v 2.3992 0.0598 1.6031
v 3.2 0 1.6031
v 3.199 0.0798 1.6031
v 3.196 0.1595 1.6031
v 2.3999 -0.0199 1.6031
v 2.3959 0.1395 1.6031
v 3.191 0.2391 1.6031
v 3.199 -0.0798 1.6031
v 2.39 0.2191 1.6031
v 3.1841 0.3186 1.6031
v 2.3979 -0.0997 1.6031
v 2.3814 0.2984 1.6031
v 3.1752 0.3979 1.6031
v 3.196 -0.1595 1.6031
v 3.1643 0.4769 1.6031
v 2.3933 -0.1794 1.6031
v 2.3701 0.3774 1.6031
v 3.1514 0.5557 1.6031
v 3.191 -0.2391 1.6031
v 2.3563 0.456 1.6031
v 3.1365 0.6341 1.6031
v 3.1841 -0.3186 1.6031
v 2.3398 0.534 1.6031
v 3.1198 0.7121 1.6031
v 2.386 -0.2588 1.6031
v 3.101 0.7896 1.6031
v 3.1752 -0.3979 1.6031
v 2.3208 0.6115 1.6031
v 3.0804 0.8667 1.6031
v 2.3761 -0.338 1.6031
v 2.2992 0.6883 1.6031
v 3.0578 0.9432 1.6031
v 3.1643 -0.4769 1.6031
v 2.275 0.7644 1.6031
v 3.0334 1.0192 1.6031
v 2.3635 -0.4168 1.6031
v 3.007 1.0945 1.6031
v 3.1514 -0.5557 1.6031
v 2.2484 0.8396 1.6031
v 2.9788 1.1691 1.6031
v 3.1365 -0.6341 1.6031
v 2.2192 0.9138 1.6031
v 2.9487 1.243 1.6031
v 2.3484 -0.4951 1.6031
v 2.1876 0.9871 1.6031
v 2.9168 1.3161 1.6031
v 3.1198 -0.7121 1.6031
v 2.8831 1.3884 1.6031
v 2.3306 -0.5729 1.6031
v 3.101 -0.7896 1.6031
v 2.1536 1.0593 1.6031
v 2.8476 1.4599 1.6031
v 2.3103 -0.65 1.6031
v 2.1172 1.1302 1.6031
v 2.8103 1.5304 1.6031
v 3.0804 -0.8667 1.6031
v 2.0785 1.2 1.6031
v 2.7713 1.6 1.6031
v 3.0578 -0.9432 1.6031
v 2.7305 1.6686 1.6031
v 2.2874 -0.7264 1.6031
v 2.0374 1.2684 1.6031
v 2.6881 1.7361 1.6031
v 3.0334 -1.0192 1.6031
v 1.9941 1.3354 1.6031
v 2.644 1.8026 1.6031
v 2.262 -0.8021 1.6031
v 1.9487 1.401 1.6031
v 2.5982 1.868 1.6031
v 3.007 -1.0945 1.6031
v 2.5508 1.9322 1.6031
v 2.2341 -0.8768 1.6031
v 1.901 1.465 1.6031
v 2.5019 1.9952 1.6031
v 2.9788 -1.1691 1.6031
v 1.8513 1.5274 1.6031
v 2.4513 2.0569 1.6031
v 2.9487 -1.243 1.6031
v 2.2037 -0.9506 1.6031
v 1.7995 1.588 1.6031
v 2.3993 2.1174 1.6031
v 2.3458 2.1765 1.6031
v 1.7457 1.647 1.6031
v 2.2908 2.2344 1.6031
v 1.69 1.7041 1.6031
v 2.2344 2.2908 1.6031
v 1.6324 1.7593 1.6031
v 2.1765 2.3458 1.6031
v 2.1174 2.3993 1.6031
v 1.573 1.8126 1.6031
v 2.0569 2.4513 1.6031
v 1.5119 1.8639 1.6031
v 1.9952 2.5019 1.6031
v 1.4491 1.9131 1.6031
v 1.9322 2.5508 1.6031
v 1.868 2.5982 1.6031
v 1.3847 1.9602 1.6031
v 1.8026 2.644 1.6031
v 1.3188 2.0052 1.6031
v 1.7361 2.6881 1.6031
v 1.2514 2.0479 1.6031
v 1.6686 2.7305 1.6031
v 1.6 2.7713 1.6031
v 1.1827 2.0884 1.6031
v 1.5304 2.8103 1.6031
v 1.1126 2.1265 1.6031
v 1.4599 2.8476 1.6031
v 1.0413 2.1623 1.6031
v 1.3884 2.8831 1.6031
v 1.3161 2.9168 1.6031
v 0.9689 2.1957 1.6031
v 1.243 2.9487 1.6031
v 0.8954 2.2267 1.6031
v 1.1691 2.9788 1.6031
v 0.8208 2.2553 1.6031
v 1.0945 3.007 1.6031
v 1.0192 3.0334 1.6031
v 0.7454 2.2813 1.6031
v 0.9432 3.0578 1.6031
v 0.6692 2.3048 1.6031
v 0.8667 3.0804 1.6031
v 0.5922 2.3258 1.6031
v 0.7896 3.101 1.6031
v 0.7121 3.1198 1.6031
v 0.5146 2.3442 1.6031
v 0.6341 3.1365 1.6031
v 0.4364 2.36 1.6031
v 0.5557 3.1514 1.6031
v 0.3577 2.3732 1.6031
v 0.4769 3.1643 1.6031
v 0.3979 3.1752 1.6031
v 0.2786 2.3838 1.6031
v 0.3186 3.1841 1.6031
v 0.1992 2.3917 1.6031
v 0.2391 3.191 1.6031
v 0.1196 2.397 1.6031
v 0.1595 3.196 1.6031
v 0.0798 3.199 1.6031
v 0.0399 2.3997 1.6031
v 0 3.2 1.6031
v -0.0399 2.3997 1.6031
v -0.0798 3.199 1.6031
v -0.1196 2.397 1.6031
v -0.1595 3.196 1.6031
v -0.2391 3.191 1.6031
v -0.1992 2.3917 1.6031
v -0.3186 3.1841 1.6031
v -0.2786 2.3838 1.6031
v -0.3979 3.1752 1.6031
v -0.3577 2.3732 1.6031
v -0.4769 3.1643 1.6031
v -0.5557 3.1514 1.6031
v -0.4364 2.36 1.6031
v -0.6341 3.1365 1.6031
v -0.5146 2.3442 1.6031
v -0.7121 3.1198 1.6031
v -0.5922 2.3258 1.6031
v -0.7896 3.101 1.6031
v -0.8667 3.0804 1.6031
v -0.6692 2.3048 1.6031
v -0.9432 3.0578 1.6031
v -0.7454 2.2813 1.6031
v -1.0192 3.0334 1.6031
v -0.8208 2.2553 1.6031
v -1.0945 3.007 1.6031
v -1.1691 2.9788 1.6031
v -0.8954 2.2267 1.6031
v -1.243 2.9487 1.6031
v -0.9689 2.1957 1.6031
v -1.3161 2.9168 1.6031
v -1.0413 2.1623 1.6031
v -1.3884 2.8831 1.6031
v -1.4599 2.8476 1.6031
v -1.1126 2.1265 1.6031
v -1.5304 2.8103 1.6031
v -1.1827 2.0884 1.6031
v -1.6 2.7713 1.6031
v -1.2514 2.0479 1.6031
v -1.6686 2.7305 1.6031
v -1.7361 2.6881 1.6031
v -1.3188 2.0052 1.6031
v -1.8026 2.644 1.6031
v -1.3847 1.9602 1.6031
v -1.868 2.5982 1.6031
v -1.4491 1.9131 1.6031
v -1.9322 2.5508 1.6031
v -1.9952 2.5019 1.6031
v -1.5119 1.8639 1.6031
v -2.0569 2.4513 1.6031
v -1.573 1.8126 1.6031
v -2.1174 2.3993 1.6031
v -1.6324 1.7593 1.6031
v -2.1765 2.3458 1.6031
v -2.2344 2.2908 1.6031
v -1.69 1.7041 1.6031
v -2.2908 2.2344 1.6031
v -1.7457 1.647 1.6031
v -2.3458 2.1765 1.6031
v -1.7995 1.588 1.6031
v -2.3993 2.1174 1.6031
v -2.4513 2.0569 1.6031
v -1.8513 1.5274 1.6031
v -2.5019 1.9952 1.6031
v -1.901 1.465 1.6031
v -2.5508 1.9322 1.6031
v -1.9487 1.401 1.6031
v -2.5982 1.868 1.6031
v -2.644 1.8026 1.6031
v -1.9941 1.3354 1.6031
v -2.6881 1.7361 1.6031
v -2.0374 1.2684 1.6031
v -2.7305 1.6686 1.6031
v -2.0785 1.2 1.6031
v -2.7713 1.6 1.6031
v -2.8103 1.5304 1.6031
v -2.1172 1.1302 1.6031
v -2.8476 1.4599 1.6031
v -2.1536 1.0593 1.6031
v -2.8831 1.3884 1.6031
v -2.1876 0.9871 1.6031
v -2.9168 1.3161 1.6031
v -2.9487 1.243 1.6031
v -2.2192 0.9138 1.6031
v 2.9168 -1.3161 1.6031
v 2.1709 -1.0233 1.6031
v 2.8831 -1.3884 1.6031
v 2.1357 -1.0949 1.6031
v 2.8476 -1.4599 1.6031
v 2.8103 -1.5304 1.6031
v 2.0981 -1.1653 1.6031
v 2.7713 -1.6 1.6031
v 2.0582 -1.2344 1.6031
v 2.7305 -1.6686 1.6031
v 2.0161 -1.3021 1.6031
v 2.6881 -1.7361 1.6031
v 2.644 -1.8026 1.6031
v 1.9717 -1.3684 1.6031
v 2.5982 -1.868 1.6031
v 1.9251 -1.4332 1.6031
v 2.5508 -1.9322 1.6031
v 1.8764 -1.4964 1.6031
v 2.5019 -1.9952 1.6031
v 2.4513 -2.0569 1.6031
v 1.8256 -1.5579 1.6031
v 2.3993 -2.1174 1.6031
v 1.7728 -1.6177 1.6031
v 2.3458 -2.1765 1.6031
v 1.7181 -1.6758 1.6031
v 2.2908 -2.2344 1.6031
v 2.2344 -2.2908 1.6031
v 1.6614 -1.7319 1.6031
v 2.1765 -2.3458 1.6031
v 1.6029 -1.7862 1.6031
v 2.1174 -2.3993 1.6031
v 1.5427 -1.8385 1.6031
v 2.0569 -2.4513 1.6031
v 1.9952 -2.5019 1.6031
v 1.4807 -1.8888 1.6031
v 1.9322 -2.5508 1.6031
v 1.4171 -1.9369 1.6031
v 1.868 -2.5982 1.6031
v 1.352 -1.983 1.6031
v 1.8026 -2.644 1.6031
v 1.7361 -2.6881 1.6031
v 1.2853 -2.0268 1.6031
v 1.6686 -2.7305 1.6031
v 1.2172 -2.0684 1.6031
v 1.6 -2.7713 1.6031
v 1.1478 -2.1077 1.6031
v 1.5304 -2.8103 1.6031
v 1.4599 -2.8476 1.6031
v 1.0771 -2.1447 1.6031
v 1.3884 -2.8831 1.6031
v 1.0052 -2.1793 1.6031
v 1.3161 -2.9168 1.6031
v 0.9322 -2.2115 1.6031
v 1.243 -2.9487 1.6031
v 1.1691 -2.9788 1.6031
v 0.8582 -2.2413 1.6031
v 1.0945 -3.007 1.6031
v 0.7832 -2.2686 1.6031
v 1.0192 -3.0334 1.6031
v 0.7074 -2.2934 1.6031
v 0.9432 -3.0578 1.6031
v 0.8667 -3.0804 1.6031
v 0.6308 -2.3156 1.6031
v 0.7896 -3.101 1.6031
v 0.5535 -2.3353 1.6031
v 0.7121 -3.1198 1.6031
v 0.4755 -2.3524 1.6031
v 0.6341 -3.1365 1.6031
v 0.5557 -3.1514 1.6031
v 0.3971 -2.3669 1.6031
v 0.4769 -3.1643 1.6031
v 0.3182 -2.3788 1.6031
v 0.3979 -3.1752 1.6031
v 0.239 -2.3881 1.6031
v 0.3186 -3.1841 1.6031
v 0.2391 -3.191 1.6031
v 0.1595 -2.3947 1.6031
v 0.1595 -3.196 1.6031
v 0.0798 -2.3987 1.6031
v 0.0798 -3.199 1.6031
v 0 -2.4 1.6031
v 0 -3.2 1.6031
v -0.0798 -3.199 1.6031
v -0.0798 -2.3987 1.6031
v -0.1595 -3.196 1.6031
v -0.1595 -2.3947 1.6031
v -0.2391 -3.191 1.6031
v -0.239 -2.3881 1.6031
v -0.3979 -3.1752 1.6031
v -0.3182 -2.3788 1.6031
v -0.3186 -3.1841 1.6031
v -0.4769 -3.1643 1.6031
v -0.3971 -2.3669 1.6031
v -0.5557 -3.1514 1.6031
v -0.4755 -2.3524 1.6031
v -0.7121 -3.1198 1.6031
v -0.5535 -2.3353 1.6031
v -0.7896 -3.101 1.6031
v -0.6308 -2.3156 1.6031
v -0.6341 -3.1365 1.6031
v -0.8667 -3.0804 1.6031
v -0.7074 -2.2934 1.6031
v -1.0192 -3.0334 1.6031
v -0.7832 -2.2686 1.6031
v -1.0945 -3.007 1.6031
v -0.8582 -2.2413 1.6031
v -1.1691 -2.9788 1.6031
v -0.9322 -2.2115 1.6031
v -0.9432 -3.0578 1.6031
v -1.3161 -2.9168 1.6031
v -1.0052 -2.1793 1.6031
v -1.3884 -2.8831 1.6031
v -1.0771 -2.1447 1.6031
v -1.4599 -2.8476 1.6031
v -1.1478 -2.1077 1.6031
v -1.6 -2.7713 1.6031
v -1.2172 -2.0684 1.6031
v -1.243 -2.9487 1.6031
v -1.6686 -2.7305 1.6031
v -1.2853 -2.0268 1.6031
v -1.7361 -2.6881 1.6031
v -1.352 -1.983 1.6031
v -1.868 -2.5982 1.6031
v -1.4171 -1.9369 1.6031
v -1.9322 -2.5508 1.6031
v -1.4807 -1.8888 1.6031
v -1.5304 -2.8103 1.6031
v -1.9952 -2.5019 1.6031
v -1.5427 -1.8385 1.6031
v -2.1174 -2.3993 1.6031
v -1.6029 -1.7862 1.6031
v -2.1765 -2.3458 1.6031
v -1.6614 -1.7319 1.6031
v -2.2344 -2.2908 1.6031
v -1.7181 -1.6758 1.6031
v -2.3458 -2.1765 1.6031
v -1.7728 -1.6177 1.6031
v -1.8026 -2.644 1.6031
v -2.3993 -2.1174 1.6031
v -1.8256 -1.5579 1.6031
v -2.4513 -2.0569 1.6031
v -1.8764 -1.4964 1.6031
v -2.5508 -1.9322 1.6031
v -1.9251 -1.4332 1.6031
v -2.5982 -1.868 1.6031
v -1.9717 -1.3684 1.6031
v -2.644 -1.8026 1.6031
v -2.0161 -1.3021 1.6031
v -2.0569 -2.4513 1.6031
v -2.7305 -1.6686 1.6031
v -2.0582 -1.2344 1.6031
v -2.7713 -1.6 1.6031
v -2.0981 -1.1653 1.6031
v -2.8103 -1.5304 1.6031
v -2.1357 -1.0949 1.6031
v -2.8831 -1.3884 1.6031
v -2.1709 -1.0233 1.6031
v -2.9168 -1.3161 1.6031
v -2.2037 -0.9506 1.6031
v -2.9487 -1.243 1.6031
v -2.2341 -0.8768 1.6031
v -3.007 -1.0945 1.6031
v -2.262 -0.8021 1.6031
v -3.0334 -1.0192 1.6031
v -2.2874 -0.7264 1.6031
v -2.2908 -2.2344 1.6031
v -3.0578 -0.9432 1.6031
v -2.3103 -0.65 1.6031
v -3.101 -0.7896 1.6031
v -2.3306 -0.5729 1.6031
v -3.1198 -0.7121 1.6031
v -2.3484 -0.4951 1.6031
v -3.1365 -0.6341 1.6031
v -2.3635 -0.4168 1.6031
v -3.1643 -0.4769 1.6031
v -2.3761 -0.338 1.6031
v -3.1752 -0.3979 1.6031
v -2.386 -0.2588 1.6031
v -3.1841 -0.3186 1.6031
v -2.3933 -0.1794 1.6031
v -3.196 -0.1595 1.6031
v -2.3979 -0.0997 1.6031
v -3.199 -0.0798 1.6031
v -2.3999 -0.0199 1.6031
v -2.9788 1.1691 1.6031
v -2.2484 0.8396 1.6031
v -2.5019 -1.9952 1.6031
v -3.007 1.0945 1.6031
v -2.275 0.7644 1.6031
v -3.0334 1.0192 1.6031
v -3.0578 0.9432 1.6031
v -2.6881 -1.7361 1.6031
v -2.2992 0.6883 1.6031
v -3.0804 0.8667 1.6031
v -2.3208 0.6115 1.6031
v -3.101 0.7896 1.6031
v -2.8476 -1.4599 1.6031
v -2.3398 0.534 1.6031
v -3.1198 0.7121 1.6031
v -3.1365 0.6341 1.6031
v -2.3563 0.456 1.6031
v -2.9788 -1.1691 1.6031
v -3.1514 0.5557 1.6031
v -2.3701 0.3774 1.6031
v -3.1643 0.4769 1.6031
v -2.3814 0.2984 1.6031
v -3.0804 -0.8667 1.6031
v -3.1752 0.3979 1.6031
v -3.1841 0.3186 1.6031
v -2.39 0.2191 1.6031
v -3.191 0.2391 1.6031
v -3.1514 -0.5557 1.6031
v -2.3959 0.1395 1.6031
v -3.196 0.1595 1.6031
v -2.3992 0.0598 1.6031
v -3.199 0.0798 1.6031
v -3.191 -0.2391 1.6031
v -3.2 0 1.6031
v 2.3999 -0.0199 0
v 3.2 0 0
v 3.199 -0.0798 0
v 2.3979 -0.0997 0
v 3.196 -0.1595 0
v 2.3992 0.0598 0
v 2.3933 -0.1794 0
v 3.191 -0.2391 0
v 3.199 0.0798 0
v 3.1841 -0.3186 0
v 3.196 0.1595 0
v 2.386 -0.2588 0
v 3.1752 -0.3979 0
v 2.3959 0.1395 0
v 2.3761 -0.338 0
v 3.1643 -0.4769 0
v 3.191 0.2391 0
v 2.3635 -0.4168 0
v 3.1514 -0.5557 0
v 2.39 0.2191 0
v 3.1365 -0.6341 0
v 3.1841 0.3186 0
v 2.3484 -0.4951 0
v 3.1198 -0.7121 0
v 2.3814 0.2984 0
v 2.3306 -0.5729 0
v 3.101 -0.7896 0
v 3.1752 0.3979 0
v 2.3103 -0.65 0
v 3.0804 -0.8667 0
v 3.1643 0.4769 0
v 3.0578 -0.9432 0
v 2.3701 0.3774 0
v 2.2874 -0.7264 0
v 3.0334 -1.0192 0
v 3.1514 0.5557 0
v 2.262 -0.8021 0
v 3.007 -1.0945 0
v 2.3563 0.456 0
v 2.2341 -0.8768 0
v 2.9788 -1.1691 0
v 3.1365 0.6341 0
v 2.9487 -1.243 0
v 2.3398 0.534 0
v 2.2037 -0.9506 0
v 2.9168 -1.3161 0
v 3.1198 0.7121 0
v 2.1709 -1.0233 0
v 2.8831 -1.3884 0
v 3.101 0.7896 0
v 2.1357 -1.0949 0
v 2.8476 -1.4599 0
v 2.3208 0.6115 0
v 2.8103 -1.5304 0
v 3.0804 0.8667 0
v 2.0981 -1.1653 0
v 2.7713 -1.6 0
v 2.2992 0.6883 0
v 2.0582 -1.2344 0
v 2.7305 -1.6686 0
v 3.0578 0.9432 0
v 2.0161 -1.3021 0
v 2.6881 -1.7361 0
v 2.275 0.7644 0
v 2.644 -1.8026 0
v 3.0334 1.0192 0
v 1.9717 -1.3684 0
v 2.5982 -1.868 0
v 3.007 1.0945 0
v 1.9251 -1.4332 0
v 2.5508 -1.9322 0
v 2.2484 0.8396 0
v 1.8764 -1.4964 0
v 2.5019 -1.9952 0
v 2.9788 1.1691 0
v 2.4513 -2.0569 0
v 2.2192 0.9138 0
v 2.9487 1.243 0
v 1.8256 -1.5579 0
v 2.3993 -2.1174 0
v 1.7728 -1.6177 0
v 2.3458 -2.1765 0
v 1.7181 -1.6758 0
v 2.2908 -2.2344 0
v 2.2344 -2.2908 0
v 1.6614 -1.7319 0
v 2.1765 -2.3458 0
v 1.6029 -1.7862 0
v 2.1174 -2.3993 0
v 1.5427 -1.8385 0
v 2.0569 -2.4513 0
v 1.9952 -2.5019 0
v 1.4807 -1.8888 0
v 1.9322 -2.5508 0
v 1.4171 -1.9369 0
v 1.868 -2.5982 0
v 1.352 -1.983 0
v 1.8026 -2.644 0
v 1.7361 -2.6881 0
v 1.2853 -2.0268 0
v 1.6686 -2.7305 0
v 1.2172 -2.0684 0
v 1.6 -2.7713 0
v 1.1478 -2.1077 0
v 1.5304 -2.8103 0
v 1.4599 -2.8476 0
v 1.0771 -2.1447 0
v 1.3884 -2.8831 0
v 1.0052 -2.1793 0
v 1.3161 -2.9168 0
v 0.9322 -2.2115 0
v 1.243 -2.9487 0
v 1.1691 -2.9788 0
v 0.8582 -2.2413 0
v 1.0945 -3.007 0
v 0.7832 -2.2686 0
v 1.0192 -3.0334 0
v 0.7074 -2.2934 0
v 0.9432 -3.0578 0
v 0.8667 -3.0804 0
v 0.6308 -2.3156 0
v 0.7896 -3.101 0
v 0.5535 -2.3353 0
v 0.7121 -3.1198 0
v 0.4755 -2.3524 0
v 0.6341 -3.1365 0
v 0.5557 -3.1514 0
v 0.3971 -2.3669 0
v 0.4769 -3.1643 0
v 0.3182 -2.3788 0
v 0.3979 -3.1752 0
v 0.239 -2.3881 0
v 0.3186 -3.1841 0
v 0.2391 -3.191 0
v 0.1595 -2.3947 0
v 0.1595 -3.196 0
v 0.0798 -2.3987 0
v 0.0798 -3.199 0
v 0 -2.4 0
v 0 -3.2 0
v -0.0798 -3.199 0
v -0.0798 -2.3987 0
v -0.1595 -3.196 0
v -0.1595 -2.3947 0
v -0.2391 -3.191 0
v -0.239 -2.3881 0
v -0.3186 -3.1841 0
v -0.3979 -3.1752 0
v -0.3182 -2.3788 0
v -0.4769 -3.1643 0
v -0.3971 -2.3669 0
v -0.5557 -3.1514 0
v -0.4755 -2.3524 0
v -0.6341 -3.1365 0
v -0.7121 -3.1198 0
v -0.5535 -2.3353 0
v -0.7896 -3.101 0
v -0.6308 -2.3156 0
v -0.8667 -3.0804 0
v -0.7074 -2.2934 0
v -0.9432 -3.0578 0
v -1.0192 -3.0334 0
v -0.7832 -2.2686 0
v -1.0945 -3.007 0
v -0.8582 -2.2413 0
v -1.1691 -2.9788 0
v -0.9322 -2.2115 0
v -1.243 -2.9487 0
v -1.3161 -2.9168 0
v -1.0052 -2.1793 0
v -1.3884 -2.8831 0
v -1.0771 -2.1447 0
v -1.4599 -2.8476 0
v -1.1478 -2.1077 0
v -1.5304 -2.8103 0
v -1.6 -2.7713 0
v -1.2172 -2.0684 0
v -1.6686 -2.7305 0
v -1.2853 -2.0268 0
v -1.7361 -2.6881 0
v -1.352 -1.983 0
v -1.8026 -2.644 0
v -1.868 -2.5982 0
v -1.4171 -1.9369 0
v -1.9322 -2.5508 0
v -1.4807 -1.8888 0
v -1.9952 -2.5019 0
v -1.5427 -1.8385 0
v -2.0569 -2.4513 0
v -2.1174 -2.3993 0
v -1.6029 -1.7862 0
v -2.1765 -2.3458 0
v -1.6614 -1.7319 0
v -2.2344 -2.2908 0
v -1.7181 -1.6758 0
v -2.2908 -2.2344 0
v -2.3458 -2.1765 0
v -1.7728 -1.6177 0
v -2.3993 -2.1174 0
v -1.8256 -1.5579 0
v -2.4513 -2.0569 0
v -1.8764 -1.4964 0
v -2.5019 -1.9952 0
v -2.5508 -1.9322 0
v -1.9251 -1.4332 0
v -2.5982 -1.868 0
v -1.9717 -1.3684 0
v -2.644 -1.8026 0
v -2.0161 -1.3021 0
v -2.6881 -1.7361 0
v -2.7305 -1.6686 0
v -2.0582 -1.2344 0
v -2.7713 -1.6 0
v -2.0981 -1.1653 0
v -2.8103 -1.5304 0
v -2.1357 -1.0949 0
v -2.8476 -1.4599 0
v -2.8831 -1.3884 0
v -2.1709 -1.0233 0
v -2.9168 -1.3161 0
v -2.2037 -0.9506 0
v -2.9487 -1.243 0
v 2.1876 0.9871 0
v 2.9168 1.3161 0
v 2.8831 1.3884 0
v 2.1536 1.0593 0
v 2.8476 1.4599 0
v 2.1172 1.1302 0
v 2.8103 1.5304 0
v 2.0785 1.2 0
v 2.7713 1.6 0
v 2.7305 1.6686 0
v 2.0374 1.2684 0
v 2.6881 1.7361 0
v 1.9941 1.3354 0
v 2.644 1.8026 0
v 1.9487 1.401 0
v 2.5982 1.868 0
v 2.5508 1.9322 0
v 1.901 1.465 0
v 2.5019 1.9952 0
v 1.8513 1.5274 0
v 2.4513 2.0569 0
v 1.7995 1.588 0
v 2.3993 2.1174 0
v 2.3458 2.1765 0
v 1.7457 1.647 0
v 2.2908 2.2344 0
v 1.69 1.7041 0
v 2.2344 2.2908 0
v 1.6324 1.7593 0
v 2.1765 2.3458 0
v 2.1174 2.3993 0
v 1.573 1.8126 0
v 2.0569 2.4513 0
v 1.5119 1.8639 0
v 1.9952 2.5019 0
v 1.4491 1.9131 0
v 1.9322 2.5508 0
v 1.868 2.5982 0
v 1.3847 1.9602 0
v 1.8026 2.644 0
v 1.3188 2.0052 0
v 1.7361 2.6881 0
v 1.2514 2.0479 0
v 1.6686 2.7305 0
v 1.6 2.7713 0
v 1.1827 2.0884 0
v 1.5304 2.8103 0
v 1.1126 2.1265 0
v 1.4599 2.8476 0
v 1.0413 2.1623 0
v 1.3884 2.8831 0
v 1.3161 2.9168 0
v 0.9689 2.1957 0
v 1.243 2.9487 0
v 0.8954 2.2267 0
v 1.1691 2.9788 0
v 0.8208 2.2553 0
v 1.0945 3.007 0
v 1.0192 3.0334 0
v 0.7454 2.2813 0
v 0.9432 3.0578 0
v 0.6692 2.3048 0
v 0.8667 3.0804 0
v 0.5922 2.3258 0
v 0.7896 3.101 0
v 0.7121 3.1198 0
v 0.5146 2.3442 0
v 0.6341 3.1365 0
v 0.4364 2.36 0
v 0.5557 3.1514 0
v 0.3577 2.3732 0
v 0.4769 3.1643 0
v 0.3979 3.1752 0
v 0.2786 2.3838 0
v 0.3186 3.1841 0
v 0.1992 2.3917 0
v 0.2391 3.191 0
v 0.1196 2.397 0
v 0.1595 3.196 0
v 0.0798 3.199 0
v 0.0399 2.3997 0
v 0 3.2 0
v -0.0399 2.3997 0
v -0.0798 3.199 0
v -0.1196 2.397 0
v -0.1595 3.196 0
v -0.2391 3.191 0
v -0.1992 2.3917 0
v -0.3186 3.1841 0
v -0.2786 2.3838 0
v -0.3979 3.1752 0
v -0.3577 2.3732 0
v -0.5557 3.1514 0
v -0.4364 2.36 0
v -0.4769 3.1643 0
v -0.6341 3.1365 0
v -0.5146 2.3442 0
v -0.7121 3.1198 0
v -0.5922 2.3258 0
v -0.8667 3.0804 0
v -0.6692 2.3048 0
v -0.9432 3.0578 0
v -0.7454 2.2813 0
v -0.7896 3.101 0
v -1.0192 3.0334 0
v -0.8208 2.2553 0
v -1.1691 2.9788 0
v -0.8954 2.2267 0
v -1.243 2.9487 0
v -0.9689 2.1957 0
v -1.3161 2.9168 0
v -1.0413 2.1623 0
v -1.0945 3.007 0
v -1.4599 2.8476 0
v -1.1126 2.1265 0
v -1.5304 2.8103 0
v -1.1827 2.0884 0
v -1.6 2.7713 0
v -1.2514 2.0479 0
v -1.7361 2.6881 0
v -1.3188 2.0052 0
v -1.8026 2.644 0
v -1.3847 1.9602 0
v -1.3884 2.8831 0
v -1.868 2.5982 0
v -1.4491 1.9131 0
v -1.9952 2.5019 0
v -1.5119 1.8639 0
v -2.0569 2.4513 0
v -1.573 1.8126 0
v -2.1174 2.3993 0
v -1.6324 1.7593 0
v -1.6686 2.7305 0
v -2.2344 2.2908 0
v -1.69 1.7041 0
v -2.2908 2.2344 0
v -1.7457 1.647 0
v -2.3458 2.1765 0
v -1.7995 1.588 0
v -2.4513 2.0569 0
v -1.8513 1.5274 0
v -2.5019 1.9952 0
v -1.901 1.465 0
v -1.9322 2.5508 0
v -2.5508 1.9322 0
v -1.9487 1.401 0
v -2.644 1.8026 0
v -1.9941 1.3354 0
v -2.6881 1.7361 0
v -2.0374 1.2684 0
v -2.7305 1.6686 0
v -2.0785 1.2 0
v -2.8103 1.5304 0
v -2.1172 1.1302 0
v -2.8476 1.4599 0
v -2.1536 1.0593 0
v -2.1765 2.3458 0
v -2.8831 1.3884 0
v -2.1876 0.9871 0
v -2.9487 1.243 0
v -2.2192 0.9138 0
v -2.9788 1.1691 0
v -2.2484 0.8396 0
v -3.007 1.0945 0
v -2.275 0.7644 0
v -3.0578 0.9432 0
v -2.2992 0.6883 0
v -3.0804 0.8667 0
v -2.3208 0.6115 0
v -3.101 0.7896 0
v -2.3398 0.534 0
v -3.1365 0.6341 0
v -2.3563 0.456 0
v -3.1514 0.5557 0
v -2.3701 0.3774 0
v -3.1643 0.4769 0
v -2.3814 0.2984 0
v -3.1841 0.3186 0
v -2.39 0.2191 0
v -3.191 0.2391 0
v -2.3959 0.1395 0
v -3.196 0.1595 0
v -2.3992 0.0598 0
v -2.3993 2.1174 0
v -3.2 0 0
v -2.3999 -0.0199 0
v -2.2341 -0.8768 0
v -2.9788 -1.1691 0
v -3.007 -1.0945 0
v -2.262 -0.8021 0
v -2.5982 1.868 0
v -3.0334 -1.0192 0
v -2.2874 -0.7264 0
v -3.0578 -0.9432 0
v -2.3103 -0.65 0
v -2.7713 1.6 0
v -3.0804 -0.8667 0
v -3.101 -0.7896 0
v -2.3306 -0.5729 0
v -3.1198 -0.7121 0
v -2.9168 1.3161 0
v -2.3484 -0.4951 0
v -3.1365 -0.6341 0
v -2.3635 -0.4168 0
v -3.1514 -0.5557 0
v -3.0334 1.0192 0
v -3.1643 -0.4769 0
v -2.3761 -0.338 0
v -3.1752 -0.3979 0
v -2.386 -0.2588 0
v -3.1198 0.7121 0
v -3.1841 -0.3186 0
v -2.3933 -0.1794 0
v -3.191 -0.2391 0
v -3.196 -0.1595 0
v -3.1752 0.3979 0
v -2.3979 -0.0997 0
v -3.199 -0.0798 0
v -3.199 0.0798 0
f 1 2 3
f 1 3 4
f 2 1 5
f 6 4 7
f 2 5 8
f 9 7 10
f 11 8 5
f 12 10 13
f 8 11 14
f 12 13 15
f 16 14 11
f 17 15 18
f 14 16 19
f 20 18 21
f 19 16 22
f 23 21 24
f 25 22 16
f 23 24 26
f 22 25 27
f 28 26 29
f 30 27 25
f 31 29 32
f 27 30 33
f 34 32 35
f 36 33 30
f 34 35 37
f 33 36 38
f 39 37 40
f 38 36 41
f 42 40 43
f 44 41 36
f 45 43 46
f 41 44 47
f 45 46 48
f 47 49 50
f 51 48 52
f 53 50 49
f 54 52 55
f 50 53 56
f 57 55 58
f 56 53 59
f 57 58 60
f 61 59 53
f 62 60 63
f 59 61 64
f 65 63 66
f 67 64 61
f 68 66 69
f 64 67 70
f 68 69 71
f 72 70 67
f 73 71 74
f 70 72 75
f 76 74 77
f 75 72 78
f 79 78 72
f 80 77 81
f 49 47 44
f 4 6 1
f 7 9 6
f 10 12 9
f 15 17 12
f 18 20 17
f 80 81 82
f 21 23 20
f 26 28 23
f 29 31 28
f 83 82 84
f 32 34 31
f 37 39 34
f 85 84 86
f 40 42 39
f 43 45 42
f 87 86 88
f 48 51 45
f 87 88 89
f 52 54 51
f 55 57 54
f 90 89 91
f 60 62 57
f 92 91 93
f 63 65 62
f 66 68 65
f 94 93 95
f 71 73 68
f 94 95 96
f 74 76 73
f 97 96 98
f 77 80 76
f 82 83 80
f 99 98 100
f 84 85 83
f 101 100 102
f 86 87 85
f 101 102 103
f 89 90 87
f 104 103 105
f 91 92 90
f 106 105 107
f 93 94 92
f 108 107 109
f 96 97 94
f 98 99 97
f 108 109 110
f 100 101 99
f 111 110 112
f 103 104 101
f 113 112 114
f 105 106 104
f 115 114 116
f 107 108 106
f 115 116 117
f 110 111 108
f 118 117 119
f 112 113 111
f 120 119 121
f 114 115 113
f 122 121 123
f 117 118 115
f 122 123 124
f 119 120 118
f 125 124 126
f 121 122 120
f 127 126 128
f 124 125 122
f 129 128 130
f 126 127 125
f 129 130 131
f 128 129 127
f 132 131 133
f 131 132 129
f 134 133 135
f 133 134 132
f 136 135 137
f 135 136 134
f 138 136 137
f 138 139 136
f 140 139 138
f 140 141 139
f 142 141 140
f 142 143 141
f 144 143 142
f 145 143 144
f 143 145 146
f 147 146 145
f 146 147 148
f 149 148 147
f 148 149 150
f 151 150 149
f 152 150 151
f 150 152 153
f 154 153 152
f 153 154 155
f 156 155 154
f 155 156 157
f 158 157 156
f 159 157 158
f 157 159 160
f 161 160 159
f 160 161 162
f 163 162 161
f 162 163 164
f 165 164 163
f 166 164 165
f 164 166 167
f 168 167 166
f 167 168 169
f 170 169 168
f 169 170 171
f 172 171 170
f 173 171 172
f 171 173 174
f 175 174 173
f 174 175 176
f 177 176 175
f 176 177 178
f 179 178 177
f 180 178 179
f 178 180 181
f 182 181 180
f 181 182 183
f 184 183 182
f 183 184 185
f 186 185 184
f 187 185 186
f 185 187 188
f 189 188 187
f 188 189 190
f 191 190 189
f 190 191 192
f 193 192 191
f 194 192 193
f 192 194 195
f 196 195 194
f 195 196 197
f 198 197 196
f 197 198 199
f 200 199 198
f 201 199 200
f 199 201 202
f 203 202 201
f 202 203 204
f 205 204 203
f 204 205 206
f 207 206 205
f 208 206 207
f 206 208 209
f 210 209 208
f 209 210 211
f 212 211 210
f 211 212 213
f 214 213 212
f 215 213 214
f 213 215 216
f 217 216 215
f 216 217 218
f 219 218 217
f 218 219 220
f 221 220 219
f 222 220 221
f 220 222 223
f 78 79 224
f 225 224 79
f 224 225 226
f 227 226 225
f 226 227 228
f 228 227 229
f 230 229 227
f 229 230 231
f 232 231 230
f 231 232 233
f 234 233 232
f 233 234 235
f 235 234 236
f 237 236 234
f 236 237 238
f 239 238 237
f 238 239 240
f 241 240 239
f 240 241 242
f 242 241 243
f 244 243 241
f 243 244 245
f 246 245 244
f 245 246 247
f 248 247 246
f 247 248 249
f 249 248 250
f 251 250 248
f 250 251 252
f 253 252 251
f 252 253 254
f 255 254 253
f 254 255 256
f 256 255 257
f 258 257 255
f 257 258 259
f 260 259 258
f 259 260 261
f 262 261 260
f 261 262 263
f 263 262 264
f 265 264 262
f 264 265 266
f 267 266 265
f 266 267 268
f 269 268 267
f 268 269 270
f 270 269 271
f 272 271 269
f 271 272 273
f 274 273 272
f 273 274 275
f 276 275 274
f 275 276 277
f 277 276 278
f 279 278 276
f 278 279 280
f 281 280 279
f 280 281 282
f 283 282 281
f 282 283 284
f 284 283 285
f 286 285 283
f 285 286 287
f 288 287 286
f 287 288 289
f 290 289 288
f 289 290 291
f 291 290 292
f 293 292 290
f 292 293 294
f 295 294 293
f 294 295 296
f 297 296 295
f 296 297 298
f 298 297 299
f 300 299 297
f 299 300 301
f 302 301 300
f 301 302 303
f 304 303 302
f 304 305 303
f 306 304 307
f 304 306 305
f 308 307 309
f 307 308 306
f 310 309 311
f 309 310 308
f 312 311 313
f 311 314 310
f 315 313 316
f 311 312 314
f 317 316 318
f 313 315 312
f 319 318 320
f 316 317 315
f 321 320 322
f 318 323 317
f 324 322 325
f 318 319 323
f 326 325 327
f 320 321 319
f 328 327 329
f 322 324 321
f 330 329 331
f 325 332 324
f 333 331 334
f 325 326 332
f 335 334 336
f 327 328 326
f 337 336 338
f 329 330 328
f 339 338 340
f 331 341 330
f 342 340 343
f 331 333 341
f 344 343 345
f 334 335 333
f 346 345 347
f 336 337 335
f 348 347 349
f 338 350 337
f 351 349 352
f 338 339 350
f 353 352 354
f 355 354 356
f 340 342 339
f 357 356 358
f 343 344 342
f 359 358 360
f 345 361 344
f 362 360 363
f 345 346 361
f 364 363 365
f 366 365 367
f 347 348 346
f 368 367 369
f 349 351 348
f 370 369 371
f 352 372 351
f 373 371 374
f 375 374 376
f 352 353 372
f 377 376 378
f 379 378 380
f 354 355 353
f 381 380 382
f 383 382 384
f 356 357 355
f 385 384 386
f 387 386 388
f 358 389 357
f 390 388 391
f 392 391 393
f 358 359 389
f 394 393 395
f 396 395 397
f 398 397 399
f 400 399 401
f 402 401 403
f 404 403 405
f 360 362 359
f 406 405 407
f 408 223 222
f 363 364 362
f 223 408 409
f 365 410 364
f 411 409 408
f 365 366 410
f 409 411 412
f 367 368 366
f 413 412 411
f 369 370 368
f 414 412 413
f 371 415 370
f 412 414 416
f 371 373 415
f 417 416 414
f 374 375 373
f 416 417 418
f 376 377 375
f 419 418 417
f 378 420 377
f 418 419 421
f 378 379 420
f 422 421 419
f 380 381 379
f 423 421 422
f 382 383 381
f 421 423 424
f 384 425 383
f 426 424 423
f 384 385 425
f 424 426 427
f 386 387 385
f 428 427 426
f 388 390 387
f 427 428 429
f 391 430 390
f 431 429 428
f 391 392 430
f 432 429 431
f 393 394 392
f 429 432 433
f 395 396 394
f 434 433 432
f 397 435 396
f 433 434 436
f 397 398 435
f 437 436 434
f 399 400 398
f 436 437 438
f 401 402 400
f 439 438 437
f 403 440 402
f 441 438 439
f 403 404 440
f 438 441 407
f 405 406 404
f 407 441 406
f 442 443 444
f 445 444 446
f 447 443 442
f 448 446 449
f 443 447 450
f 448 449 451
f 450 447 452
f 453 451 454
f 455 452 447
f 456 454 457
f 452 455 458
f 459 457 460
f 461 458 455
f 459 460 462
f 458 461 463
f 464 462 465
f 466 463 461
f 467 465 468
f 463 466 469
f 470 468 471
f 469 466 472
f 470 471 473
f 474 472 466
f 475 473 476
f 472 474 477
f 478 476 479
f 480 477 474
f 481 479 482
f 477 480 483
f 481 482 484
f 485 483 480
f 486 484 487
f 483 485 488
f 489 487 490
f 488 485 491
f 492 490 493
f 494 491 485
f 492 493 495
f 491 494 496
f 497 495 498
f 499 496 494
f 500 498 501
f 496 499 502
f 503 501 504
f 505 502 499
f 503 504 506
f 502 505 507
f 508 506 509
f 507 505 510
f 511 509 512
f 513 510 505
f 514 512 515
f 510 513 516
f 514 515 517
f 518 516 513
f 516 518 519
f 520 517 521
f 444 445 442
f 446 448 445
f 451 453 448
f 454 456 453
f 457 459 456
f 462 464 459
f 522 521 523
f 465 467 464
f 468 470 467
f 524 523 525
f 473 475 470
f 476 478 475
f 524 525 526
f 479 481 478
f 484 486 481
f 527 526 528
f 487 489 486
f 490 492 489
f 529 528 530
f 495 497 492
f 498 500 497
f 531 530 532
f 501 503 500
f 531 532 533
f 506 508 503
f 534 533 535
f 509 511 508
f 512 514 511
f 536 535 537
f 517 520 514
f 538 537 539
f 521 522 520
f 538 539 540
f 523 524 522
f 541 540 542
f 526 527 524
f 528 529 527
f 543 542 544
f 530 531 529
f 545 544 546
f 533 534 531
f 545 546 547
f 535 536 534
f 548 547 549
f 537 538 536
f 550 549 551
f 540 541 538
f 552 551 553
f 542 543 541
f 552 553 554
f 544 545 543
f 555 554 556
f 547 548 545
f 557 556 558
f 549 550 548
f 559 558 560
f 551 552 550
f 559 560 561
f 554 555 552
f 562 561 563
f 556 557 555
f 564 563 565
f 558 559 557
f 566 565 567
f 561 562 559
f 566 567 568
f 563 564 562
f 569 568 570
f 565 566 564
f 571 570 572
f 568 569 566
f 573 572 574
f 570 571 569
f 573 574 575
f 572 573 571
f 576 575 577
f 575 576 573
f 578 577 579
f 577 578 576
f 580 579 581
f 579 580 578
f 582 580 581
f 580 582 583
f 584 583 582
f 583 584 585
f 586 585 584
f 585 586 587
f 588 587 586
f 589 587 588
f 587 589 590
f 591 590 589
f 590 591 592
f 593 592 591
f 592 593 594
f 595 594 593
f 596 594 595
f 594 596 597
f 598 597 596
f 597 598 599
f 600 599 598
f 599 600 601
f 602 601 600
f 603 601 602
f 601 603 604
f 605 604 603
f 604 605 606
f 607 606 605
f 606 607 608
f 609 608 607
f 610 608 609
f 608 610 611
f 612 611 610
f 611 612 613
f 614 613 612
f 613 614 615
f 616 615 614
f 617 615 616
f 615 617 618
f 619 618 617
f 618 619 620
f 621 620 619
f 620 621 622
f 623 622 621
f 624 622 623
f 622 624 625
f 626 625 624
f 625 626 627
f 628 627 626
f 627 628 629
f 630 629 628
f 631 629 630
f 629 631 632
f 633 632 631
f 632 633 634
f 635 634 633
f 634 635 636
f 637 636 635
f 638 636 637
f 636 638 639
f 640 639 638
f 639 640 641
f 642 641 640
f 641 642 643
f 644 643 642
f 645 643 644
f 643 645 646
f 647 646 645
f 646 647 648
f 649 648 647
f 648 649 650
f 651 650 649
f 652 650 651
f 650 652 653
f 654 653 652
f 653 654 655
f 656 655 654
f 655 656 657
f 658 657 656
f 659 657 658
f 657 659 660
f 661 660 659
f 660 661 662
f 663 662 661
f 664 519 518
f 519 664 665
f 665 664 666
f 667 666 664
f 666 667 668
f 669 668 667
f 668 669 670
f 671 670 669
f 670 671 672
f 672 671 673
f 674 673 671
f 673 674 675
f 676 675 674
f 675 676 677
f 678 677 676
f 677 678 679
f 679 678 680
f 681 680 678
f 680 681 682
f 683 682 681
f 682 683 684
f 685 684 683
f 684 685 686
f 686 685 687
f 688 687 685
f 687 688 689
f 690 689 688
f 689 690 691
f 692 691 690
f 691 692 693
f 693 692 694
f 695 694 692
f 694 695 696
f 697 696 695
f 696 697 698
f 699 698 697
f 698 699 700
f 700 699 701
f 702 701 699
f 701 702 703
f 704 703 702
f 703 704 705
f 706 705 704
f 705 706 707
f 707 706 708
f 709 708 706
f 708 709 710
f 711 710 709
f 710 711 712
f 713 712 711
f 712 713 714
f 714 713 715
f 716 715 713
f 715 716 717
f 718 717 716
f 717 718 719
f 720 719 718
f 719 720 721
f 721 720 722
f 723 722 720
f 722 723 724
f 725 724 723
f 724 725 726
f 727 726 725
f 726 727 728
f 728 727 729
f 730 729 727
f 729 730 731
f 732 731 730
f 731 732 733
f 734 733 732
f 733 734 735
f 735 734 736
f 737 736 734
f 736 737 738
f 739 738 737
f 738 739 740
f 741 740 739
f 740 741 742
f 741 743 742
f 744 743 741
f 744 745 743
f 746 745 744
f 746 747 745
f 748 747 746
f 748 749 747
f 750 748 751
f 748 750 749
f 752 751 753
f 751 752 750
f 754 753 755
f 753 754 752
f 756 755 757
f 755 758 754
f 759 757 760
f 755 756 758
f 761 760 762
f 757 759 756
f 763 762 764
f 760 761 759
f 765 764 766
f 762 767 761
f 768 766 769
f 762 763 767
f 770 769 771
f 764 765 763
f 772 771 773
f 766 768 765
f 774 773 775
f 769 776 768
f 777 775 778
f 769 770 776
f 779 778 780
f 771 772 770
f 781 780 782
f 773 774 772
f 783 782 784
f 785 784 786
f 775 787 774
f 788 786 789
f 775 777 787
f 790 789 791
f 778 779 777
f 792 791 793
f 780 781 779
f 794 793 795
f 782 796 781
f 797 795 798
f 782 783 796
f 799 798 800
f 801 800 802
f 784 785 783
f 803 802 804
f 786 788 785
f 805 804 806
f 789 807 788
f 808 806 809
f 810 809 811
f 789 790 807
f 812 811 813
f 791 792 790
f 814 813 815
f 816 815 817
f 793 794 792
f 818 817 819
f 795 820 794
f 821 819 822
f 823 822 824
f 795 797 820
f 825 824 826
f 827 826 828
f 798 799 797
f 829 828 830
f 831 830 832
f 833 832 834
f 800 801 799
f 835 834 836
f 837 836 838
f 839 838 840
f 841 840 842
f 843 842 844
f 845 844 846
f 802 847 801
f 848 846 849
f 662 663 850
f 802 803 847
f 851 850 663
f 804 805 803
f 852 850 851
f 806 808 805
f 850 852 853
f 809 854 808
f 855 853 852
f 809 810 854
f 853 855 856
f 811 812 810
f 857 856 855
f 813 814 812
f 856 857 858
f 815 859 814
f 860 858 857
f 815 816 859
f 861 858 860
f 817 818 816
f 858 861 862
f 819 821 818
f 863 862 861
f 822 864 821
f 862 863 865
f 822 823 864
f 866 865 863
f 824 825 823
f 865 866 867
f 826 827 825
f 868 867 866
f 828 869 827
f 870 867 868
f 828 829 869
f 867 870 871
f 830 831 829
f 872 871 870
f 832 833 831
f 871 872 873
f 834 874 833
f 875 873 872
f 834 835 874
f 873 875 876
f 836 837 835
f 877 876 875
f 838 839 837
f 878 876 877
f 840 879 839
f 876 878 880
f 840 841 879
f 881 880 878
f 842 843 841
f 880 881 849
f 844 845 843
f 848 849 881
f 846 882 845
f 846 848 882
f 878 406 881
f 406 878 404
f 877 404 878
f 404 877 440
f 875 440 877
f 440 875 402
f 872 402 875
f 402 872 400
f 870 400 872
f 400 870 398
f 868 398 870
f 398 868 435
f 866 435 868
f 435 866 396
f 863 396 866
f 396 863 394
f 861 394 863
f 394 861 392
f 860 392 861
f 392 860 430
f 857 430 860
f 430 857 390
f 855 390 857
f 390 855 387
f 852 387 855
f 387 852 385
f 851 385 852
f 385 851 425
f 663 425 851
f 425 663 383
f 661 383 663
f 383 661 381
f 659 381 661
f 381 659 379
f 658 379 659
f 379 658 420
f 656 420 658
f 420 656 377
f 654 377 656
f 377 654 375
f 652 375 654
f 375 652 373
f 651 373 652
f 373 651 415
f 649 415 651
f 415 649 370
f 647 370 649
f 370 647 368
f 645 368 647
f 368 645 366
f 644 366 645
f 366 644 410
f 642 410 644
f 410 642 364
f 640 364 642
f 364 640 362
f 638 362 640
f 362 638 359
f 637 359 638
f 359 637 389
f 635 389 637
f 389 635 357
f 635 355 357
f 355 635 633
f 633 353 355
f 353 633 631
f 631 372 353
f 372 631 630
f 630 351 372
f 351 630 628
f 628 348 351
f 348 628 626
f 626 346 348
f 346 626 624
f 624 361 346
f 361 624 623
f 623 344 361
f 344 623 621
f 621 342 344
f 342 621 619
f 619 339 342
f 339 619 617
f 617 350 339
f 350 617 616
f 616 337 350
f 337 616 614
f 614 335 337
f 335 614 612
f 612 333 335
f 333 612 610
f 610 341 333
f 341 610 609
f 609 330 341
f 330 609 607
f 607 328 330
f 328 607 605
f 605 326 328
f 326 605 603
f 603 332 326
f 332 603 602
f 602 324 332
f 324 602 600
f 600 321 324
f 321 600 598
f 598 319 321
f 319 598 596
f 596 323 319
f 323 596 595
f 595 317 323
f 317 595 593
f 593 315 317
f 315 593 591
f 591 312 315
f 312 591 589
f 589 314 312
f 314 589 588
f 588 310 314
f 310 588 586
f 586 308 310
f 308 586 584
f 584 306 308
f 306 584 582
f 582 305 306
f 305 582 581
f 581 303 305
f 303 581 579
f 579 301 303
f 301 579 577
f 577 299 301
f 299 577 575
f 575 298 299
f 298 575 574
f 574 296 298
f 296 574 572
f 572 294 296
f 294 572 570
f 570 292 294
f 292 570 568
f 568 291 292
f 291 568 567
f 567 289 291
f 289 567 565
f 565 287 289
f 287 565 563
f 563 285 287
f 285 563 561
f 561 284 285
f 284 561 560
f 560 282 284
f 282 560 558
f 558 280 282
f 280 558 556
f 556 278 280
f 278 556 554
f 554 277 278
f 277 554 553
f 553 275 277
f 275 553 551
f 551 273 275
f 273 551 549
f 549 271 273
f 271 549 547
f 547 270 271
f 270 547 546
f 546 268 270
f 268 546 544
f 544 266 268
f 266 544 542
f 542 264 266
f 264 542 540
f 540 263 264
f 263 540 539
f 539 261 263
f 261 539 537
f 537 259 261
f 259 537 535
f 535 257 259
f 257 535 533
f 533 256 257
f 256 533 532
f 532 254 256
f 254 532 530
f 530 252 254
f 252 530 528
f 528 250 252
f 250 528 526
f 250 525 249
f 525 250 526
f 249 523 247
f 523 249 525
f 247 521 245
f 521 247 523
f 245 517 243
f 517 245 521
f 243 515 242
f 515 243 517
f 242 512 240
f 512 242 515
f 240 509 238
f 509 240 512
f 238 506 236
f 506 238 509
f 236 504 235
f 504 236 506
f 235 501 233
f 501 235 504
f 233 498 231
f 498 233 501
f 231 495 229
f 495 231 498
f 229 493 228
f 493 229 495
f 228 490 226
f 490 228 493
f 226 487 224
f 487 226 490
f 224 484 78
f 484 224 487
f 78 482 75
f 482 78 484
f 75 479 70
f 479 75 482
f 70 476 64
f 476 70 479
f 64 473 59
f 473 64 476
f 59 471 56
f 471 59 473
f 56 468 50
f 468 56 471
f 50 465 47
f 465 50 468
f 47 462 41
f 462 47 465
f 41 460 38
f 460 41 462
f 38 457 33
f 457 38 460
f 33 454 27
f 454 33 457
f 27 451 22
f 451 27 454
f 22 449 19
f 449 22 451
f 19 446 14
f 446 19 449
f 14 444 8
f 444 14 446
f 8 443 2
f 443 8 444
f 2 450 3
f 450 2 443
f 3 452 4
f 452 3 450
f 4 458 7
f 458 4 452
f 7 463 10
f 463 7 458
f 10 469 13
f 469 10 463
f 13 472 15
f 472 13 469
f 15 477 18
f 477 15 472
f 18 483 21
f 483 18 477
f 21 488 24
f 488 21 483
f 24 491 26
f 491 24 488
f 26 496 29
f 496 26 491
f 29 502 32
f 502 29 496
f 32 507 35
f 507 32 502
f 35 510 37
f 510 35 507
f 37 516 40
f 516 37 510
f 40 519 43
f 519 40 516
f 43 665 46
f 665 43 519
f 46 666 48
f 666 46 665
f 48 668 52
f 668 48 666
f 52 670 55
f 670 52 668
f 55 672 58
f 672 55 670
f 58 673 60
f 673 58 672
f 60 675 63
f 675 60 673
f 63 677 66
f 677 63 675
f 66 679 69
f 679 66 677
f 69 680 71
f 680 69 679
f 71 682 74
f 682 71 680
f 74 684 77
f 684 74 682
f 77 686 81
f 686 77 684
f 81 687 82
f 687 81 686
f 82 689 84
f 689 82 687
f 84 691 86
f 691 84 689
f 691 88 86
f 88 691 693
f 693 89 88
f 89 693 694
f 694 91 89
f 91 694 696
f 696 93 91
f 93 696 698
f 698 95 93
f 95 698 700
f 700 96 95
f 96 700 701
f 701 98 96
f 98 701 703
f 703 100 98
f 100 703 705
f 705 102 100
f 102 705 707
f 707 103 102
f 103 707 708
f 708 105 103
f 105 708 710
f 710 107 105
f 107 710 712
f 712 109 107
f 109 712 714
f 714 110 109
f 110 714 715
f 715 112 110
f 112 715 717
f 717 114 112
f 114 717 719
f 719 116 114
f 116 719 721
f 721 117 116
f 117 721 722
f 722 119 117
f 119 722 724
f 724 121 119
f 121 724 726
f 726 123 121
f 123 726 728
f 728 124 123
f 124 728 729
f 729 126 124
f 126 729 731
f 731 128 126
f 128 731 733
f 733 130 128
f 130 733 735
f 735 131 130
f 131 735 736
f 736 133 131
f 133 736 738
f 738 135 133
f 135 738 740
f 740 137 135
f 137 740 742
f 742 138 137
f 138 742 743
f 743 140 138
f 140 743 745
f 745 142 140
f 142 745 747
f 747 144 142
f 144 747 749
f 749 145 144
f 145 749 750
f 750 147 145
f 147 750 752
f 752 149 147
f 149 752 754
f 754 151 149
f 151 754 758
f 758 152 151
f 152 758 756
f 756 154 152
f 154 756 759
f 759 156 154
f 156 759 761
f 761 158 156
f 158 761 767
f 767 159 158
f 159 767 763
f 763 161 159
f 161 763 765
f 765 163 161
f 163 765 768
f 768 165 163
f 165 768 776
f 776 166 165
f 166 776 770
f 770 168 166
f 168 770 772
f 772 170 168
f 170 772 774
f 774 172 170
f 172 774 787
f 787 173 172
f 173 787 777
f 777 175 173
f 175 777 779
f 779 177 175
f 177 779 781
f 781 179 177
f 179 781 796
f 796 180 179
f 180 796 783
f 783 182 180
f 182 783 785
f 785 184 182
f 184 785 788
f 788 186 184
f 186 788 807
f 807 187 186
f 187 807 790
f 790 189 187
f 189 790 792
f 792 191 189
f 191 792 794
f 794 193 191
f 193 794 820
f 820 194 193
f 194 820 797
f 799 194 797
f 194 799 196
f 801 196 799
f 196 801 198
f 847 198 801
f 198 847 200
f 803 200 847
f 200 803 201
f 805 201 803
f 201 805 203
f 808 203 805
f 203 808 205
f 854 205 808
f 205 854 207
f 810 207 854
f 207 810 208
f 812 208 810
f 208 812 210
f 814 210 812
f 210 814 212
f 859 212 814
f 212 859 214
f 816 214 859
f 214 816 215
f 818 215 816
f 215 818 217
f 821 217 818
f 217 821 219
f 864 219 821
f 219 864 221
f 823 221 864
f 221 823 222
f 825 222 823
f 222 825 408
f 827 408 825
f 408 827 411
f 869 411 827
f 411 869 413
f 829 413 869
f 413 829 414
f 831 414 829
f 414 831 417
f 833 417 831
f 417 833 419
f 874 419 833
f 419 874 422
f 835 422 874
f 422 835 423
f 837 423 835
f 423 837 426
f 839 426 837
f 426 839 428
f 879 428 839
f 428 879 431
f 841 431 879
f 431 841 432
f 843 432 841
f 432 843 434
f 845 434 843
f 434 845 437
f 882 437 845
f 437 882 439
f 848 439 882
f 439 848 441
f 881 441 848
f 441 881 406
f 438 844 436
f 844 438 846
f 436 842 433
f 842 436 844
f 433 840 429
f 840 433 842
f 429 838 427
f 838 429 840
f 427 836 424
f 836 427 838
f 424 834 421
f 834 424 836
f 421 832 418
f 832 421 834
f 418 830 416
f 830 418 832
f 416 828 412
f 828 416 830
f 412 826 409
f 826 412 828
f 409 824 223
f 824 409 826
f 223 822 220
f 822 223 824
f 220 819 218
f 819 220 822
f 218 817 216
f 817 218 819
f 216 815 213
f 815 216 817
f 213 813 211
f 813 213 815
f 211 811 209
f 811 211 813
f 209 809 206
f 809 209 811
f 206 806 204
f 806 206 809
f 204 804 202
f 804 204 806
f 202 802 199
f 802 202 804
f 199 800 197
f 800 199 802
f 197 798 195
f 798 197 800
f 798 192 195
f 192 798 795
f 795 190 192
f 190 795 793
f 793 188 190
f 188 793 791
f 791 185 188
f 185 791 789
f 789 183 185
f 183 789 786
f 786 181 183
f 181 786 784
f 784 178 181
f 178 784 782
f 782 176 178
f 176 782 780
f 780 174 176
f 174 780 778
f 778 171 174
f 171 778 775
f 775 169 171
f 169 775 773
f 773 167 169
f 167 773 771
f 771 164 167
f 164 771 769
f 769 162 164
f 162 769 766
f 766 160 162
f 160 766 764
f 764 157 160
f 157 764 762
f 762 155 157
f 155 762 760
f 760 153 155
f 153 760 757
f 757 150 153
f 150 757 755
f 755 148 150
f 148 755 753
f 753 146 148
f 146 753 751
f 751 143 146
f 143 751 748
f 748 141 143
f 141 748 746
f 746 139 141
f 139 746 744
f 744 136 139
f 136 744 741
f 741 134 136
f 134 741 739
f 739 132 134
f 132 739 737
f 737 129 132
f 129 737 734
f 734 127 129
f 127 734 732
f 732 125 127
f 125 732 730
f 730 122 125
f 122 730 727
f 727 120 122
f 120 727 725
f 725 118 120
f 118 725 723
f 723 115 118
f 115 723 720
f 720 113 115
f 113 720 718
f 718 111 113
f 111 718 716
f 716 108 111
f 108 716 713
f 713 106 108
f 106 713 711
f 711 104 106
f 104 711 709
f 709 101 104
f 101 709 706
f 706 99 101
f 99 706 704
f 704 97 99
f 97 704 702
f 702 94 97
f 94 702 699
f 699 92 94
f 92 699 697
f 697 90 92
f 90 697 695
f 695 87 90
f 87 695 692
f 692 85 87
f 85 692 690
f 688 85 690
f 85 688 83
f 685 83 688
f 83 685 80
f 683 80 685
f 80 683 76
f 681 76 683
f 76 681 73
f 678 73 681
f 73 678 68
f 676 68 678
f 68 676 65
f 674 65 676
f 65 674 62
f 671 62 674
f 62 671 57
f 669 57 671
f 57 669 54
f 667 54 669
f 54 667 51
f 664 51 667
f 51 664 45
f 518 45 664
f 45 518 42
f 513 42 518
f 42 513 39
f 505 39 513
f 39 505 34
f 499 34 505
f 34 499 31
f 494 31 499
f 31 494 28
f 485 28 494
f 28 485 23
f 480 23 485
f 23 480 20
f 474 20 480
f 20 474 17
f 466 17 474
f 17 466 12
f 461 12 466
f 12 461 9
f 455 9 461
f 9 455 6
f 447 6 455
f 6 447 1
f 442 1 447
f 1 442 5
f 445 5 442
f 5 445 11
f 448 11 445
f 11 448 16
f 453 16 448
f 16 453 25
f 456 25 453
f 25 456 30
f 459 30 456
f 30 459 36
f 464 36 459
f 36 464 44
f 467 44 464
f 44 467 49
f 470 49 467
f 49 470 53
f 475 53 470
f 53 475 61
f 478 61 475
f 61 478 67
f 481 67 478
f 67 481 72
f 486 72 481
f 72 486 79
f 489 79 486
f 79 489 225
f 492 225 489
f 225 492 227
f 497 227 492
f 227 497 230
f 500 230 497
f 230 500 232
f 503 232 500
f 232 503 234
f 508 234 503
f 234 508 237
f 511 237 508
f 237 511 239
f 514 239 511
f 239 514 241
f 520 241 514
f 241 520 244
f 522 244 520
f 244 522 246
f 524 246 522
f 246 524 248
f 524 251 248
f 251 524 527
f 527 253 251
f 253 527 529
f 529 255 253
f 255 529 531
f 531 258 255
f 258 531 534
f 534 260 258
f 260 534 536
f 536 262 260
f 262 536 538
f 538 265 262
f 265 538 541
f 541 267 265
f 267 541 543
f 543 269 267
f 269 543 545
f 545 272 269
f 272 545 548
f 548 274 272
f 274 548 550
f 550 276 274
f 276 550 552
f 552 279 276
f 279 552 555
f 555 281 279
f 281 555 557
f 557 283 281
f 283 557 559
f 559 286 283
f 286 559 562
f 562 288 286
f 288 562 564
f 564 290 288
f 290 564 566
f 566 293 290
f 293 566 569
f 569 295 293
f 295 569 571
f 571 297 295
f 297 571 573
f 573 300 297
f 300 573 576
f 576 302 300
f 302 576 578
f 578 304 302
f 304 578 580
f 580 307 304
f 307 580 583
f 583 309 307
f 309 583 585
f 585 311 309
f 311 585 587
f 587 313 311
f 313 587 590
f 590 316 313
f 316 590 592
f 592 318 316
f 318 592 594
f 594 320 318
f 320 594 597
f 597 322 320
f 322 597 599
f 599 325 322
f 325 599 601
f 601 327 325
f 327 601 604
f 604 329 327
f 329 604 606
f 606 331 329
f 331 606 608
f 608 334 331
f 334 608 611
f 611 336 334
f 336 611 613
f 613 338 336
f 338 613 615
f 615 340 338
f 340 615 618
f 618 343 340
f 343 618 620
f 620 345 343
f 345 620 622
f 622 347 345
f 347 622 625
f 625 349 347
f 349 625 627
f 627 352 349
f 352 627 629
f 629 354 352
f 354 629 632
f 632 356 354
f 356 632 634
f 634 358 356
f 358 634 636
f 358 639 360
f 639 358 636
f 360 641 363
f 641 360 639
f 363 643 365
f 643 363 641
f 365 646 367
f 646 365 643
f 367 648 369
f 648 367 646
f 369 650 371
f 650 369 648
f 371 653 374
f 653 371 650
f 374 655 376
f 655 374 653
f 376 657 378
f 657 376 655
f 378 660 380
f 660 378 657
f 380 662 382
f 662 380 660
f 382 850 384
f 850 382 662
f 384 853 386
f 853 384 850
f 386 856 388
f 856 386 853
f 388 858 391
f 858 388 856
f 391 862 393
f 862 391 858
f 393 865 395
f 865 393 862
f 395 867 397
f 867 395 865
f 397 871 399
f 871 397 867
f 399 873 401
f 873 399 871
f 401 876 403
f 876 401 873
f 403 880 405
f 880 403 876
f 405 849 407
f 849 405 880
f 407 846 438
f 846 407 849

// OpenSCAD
use <../lib.scad>
use <90462apq1.scad>
$fa=1; $fs=0.2;
function ldraw_lib__90462pq1(realsolid=false) = [
// 0 ~Moved to 90462apq1
// 0 Name: 90462pq1.dat
// 0 Author: [PTadmin]
// 0 !LDRAW_ORG Part UPDATE 2017-01
// 0 !LICENSE Licensed under CC BY 4.0 : see CAreadme.txt
// 
// 0 BFC CERTIFY CCW
  [0,"BFC","CERTIFY"],
  [0,"BFC","CCW"],
// 
// 0 !HISTORY 2017-12-30 [PTadmin] Official Update 2017-01
// 
// 
// 0 // Minifig Headdress Nemes with Darkblue Stripes Pattern
// 1 16 0 0 0 1 0 0 0 1 0 0 0 1 90462apq1.dat
  [1,16,0,0,0,1,0,0,0,1,0,0,0,1, ldraw_lib__90462apq1(realsolid)],
];
module ldraw_lib__90462pq1(step=0, col=false, unit=2/5, alt=false, line=0.2, solid=!$preview)
    makepoly(ldraw_lib__90462pq1(solid), step=step, col=col, unit=unit, alt=alt, line=line, solid=solid);
ldraw_lib__90462pq1(line=0.2);
